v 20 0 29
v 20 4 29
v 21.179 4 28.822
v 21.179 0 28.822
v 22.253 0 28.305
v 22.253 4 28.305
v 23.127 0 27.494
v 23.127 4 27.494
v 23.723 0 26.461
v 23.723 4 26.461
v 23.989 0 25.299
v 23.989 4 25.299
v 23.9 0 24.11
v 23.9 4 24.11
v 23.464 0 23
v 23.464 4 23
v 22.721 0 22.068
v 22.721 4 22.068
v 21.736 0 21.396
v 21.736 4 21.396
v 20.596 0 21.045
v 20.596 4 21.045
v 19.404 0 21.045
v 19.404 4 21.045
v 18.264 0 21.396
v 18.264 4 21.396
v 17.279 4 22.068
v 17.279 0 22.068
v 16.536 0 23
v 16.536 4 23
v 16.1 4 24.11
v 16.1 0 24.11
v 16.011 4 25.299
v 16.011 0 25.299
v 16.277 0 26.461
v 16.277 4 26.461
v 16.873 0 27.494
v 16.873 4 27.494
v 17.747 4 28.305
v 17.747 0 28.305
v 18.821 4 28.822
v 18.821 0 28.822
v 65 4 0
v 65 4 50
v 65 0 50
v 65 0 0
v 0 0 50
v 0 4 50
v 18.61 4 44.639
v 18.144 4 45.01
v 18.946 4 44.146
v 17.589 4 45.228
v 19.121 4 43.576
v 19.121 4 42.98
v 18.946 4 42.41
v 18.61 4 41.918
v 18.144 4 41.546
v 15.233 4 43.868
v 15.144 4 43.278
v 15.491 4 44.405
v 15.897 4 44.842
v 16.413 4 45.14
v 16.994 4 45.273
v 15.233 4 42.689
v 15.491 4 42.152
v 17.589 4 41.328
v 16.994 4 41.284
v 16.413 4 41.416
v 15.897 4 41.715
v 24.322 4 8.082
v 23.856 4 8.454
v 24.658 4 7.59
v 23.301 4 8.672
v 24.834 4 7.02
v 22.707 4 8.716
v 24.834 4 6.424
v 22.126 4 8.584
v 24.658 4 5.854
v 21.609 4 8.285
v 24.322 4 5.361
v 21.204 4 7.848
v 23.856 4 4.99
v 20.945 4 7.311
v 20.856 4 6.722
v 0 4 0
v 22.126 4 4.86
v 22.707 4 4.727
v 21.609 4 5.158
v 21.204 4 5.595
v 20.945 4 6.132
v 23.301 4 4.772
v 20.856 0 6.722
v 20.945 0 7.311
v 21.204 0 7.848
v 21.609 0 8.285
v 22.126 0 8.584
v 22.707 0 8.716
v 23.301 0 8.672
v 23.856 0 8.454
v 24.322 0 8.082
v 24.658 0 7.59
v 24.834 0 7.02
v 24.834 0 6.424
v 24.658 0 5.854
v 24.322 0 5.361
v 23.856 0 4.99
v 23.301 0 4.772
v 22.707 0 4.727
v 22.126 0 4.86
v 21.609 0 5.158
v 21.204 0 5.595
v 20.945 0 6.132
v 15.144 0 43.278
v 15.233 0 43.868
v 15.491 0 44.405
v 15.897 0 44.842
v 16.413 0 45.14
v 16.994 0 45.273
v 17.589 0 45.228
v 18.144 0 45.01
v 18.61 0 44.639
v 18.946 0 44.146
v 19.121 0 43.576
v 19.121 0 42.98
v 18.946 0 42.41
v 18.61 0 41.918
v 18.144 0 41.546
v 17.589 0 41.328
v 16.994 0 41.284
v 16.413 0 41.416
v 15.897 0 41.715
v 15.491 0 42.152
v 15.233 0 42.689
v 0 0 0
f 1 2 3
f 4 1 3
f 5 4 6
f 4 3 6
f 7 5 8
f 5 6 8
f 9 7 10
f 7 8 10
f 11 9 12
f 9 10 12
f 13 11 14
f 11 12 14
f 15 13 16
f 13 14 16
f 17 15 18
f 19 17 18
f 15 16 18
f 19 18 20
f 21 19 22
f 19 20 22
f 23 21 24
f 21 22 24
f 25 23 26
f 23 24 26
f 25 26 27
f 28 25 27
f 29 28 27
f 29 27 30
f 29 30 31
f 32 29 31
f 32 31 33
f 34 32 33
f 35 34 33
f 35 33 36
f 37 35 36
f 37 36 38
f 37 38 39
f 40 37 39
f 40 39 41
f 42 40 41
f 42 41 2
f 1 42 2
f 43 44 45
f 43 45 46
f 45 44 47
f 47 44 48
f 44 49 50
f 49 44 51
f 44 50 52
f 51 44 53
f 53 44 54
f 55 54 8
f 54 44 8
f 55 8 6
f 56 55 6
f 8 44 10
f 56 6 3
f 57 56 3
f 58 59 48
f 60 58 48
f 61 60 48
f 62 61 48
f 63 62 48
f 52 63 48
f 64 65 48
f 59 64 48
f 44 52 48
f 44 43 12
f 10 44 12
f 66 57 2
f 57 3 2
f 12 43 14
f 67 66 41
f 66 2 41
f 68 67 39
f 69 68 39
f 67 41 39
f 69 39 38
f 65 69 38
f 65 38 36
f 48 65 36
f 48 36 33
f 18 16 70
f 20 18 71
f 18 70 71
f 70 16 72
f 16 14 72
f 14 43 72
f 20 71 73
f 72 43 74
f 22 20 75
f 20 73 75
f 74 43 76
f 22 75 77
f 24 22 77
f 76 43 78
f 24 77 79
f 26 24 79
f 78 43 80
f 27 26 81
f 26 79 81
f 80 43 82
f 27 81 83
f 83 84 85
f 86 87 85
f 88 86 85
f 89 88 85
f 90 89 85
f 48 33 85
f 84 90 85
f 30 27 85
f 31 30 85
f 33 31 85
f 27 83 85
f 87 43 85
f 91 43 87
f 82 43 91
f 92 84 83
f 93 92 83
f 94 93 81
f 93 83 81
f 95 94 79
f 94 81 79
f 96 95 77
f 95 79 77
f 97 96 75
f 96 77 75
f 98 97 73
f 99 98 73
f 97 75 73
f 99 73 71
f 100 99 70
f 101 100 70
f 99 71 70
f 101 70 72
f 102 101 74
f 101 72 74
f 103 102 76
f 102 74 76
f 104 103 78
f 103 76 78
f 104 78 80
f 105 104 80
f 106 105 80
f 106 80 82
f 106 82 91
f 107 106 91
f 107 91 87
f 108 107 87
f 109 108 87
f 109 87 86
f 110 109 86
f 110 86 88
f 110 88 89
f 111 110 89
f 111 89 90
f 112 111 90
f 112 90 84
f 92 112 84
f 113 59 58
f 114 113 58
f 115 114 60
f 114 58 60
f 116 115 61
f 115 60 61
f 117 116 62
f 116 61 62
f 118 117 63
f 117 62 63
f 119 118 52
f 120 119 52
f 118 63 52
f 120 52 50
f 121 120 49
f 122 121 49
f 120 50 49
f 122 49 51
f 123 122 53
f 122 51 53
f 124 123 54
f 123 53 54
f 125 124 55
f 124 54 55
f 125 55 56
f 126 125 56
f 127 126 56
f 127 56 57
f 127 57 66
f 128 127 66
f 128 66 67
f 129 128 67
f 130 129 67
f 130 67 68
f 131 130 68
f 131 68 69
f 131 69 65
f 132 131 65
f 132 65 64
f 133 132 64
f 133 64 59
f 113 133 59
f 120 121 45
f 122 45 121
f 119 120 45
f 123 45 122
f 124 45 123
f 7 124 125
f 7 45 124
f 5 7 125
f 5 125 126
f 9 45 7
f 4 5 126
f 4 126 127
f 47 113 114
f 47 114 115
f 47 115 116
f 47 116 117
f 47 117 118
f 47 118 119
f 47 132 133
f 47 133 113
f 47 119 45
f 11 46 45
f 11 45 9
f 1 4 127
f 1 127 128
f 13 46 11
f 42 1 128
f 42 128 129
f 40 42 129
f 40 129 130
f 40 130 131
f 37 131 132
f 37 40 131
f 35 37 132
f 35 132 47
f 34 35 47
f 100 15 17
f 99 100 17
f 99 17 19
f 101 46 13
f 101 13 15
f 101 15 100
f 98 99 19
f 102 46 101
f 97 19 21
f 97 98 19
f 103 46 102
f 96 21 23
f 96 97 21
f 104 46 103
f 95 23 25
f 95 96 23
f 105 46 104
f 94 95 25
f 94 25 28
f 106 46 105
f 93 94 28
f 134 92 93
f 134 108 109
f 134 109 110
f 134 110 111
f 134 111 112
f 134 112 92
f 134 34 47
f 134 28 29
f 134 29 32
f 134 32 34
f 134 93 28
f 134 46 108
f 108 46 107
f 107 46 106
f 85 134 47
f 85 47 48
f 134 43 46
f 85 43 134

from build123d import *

# Parameters (mm, degrees)
BOSS_EXTRUDE1_DEPTH = 50
SKETCH3_R           = 4
CUT_EXTRUDE1_DEPTH  = 10
SKETCH4_W           = 25
SKETCH4_H           = 50
CUT_EXTRUDE2_DEPTH  = 10
SKETCH6_R           = 2
CUT_EXTRUDE4_DEPTH  = 83.1035931


with BuildPart() as part:
    # Sketch2 → Boss-Extrude1 (new body)
    with BuildSketch(Plane.XY):
        Polygon((4, 4), (90, 4), (90, 0), (0, 0), (0, 4), align=None)
    extrude(amount=BOSS_EXTRUDE1_DEPTH)

    # Sketch3 → Cut-Extrude1 (cut)
    with BuildSketch(Plane(origin=(0, 4, 0), x_dir=(1, 0, 0), z_dir=(0, 1, 0))):
        with Locations(Location((20, -25, 0), (0, 0, 270))):
            Circle(SKETCH3_R)
    extrude(amount=-CUT_EXTRUDE1_DEPTH, mode=Mode.SUBTRACT)

    # Sketch4 → Cut-Extrude2 (cut)
    with BuildSketch(Plane(origin=(0, 4, 0), x_dir=(1, 0, 0), z_dir=(0, 1, 0))):
        with Locations((77.5, -25)):
            Rectangle(SKETCH4_W, SKETCH4_H)
    extrude(amount=-CUT_EXTRUDE2_DEPTH, mode=Mode.SUBTRACT)

    # Sketch6 → Cut-Extrude4 (cut, through all)
    with BuildSketch(Plane(origin=(0, 4, 0), x_dir=(1, 0, 0), z_dir=(0, 1, 0))):
        with Locations(Location((17.143662574, -43.278165567, 0), (0, 0, 180))):
            Circle(SKETCH6_R)
        with Locations(Location((22.856337427, -6.721834433, 0), (0, 0, 180))):
            Circle(SKETCH6_R)
    extrude(amount=-CUT_EXTRUDE4_DEPTH, mode=Mode.SUBTRACT)


solid = part.part
